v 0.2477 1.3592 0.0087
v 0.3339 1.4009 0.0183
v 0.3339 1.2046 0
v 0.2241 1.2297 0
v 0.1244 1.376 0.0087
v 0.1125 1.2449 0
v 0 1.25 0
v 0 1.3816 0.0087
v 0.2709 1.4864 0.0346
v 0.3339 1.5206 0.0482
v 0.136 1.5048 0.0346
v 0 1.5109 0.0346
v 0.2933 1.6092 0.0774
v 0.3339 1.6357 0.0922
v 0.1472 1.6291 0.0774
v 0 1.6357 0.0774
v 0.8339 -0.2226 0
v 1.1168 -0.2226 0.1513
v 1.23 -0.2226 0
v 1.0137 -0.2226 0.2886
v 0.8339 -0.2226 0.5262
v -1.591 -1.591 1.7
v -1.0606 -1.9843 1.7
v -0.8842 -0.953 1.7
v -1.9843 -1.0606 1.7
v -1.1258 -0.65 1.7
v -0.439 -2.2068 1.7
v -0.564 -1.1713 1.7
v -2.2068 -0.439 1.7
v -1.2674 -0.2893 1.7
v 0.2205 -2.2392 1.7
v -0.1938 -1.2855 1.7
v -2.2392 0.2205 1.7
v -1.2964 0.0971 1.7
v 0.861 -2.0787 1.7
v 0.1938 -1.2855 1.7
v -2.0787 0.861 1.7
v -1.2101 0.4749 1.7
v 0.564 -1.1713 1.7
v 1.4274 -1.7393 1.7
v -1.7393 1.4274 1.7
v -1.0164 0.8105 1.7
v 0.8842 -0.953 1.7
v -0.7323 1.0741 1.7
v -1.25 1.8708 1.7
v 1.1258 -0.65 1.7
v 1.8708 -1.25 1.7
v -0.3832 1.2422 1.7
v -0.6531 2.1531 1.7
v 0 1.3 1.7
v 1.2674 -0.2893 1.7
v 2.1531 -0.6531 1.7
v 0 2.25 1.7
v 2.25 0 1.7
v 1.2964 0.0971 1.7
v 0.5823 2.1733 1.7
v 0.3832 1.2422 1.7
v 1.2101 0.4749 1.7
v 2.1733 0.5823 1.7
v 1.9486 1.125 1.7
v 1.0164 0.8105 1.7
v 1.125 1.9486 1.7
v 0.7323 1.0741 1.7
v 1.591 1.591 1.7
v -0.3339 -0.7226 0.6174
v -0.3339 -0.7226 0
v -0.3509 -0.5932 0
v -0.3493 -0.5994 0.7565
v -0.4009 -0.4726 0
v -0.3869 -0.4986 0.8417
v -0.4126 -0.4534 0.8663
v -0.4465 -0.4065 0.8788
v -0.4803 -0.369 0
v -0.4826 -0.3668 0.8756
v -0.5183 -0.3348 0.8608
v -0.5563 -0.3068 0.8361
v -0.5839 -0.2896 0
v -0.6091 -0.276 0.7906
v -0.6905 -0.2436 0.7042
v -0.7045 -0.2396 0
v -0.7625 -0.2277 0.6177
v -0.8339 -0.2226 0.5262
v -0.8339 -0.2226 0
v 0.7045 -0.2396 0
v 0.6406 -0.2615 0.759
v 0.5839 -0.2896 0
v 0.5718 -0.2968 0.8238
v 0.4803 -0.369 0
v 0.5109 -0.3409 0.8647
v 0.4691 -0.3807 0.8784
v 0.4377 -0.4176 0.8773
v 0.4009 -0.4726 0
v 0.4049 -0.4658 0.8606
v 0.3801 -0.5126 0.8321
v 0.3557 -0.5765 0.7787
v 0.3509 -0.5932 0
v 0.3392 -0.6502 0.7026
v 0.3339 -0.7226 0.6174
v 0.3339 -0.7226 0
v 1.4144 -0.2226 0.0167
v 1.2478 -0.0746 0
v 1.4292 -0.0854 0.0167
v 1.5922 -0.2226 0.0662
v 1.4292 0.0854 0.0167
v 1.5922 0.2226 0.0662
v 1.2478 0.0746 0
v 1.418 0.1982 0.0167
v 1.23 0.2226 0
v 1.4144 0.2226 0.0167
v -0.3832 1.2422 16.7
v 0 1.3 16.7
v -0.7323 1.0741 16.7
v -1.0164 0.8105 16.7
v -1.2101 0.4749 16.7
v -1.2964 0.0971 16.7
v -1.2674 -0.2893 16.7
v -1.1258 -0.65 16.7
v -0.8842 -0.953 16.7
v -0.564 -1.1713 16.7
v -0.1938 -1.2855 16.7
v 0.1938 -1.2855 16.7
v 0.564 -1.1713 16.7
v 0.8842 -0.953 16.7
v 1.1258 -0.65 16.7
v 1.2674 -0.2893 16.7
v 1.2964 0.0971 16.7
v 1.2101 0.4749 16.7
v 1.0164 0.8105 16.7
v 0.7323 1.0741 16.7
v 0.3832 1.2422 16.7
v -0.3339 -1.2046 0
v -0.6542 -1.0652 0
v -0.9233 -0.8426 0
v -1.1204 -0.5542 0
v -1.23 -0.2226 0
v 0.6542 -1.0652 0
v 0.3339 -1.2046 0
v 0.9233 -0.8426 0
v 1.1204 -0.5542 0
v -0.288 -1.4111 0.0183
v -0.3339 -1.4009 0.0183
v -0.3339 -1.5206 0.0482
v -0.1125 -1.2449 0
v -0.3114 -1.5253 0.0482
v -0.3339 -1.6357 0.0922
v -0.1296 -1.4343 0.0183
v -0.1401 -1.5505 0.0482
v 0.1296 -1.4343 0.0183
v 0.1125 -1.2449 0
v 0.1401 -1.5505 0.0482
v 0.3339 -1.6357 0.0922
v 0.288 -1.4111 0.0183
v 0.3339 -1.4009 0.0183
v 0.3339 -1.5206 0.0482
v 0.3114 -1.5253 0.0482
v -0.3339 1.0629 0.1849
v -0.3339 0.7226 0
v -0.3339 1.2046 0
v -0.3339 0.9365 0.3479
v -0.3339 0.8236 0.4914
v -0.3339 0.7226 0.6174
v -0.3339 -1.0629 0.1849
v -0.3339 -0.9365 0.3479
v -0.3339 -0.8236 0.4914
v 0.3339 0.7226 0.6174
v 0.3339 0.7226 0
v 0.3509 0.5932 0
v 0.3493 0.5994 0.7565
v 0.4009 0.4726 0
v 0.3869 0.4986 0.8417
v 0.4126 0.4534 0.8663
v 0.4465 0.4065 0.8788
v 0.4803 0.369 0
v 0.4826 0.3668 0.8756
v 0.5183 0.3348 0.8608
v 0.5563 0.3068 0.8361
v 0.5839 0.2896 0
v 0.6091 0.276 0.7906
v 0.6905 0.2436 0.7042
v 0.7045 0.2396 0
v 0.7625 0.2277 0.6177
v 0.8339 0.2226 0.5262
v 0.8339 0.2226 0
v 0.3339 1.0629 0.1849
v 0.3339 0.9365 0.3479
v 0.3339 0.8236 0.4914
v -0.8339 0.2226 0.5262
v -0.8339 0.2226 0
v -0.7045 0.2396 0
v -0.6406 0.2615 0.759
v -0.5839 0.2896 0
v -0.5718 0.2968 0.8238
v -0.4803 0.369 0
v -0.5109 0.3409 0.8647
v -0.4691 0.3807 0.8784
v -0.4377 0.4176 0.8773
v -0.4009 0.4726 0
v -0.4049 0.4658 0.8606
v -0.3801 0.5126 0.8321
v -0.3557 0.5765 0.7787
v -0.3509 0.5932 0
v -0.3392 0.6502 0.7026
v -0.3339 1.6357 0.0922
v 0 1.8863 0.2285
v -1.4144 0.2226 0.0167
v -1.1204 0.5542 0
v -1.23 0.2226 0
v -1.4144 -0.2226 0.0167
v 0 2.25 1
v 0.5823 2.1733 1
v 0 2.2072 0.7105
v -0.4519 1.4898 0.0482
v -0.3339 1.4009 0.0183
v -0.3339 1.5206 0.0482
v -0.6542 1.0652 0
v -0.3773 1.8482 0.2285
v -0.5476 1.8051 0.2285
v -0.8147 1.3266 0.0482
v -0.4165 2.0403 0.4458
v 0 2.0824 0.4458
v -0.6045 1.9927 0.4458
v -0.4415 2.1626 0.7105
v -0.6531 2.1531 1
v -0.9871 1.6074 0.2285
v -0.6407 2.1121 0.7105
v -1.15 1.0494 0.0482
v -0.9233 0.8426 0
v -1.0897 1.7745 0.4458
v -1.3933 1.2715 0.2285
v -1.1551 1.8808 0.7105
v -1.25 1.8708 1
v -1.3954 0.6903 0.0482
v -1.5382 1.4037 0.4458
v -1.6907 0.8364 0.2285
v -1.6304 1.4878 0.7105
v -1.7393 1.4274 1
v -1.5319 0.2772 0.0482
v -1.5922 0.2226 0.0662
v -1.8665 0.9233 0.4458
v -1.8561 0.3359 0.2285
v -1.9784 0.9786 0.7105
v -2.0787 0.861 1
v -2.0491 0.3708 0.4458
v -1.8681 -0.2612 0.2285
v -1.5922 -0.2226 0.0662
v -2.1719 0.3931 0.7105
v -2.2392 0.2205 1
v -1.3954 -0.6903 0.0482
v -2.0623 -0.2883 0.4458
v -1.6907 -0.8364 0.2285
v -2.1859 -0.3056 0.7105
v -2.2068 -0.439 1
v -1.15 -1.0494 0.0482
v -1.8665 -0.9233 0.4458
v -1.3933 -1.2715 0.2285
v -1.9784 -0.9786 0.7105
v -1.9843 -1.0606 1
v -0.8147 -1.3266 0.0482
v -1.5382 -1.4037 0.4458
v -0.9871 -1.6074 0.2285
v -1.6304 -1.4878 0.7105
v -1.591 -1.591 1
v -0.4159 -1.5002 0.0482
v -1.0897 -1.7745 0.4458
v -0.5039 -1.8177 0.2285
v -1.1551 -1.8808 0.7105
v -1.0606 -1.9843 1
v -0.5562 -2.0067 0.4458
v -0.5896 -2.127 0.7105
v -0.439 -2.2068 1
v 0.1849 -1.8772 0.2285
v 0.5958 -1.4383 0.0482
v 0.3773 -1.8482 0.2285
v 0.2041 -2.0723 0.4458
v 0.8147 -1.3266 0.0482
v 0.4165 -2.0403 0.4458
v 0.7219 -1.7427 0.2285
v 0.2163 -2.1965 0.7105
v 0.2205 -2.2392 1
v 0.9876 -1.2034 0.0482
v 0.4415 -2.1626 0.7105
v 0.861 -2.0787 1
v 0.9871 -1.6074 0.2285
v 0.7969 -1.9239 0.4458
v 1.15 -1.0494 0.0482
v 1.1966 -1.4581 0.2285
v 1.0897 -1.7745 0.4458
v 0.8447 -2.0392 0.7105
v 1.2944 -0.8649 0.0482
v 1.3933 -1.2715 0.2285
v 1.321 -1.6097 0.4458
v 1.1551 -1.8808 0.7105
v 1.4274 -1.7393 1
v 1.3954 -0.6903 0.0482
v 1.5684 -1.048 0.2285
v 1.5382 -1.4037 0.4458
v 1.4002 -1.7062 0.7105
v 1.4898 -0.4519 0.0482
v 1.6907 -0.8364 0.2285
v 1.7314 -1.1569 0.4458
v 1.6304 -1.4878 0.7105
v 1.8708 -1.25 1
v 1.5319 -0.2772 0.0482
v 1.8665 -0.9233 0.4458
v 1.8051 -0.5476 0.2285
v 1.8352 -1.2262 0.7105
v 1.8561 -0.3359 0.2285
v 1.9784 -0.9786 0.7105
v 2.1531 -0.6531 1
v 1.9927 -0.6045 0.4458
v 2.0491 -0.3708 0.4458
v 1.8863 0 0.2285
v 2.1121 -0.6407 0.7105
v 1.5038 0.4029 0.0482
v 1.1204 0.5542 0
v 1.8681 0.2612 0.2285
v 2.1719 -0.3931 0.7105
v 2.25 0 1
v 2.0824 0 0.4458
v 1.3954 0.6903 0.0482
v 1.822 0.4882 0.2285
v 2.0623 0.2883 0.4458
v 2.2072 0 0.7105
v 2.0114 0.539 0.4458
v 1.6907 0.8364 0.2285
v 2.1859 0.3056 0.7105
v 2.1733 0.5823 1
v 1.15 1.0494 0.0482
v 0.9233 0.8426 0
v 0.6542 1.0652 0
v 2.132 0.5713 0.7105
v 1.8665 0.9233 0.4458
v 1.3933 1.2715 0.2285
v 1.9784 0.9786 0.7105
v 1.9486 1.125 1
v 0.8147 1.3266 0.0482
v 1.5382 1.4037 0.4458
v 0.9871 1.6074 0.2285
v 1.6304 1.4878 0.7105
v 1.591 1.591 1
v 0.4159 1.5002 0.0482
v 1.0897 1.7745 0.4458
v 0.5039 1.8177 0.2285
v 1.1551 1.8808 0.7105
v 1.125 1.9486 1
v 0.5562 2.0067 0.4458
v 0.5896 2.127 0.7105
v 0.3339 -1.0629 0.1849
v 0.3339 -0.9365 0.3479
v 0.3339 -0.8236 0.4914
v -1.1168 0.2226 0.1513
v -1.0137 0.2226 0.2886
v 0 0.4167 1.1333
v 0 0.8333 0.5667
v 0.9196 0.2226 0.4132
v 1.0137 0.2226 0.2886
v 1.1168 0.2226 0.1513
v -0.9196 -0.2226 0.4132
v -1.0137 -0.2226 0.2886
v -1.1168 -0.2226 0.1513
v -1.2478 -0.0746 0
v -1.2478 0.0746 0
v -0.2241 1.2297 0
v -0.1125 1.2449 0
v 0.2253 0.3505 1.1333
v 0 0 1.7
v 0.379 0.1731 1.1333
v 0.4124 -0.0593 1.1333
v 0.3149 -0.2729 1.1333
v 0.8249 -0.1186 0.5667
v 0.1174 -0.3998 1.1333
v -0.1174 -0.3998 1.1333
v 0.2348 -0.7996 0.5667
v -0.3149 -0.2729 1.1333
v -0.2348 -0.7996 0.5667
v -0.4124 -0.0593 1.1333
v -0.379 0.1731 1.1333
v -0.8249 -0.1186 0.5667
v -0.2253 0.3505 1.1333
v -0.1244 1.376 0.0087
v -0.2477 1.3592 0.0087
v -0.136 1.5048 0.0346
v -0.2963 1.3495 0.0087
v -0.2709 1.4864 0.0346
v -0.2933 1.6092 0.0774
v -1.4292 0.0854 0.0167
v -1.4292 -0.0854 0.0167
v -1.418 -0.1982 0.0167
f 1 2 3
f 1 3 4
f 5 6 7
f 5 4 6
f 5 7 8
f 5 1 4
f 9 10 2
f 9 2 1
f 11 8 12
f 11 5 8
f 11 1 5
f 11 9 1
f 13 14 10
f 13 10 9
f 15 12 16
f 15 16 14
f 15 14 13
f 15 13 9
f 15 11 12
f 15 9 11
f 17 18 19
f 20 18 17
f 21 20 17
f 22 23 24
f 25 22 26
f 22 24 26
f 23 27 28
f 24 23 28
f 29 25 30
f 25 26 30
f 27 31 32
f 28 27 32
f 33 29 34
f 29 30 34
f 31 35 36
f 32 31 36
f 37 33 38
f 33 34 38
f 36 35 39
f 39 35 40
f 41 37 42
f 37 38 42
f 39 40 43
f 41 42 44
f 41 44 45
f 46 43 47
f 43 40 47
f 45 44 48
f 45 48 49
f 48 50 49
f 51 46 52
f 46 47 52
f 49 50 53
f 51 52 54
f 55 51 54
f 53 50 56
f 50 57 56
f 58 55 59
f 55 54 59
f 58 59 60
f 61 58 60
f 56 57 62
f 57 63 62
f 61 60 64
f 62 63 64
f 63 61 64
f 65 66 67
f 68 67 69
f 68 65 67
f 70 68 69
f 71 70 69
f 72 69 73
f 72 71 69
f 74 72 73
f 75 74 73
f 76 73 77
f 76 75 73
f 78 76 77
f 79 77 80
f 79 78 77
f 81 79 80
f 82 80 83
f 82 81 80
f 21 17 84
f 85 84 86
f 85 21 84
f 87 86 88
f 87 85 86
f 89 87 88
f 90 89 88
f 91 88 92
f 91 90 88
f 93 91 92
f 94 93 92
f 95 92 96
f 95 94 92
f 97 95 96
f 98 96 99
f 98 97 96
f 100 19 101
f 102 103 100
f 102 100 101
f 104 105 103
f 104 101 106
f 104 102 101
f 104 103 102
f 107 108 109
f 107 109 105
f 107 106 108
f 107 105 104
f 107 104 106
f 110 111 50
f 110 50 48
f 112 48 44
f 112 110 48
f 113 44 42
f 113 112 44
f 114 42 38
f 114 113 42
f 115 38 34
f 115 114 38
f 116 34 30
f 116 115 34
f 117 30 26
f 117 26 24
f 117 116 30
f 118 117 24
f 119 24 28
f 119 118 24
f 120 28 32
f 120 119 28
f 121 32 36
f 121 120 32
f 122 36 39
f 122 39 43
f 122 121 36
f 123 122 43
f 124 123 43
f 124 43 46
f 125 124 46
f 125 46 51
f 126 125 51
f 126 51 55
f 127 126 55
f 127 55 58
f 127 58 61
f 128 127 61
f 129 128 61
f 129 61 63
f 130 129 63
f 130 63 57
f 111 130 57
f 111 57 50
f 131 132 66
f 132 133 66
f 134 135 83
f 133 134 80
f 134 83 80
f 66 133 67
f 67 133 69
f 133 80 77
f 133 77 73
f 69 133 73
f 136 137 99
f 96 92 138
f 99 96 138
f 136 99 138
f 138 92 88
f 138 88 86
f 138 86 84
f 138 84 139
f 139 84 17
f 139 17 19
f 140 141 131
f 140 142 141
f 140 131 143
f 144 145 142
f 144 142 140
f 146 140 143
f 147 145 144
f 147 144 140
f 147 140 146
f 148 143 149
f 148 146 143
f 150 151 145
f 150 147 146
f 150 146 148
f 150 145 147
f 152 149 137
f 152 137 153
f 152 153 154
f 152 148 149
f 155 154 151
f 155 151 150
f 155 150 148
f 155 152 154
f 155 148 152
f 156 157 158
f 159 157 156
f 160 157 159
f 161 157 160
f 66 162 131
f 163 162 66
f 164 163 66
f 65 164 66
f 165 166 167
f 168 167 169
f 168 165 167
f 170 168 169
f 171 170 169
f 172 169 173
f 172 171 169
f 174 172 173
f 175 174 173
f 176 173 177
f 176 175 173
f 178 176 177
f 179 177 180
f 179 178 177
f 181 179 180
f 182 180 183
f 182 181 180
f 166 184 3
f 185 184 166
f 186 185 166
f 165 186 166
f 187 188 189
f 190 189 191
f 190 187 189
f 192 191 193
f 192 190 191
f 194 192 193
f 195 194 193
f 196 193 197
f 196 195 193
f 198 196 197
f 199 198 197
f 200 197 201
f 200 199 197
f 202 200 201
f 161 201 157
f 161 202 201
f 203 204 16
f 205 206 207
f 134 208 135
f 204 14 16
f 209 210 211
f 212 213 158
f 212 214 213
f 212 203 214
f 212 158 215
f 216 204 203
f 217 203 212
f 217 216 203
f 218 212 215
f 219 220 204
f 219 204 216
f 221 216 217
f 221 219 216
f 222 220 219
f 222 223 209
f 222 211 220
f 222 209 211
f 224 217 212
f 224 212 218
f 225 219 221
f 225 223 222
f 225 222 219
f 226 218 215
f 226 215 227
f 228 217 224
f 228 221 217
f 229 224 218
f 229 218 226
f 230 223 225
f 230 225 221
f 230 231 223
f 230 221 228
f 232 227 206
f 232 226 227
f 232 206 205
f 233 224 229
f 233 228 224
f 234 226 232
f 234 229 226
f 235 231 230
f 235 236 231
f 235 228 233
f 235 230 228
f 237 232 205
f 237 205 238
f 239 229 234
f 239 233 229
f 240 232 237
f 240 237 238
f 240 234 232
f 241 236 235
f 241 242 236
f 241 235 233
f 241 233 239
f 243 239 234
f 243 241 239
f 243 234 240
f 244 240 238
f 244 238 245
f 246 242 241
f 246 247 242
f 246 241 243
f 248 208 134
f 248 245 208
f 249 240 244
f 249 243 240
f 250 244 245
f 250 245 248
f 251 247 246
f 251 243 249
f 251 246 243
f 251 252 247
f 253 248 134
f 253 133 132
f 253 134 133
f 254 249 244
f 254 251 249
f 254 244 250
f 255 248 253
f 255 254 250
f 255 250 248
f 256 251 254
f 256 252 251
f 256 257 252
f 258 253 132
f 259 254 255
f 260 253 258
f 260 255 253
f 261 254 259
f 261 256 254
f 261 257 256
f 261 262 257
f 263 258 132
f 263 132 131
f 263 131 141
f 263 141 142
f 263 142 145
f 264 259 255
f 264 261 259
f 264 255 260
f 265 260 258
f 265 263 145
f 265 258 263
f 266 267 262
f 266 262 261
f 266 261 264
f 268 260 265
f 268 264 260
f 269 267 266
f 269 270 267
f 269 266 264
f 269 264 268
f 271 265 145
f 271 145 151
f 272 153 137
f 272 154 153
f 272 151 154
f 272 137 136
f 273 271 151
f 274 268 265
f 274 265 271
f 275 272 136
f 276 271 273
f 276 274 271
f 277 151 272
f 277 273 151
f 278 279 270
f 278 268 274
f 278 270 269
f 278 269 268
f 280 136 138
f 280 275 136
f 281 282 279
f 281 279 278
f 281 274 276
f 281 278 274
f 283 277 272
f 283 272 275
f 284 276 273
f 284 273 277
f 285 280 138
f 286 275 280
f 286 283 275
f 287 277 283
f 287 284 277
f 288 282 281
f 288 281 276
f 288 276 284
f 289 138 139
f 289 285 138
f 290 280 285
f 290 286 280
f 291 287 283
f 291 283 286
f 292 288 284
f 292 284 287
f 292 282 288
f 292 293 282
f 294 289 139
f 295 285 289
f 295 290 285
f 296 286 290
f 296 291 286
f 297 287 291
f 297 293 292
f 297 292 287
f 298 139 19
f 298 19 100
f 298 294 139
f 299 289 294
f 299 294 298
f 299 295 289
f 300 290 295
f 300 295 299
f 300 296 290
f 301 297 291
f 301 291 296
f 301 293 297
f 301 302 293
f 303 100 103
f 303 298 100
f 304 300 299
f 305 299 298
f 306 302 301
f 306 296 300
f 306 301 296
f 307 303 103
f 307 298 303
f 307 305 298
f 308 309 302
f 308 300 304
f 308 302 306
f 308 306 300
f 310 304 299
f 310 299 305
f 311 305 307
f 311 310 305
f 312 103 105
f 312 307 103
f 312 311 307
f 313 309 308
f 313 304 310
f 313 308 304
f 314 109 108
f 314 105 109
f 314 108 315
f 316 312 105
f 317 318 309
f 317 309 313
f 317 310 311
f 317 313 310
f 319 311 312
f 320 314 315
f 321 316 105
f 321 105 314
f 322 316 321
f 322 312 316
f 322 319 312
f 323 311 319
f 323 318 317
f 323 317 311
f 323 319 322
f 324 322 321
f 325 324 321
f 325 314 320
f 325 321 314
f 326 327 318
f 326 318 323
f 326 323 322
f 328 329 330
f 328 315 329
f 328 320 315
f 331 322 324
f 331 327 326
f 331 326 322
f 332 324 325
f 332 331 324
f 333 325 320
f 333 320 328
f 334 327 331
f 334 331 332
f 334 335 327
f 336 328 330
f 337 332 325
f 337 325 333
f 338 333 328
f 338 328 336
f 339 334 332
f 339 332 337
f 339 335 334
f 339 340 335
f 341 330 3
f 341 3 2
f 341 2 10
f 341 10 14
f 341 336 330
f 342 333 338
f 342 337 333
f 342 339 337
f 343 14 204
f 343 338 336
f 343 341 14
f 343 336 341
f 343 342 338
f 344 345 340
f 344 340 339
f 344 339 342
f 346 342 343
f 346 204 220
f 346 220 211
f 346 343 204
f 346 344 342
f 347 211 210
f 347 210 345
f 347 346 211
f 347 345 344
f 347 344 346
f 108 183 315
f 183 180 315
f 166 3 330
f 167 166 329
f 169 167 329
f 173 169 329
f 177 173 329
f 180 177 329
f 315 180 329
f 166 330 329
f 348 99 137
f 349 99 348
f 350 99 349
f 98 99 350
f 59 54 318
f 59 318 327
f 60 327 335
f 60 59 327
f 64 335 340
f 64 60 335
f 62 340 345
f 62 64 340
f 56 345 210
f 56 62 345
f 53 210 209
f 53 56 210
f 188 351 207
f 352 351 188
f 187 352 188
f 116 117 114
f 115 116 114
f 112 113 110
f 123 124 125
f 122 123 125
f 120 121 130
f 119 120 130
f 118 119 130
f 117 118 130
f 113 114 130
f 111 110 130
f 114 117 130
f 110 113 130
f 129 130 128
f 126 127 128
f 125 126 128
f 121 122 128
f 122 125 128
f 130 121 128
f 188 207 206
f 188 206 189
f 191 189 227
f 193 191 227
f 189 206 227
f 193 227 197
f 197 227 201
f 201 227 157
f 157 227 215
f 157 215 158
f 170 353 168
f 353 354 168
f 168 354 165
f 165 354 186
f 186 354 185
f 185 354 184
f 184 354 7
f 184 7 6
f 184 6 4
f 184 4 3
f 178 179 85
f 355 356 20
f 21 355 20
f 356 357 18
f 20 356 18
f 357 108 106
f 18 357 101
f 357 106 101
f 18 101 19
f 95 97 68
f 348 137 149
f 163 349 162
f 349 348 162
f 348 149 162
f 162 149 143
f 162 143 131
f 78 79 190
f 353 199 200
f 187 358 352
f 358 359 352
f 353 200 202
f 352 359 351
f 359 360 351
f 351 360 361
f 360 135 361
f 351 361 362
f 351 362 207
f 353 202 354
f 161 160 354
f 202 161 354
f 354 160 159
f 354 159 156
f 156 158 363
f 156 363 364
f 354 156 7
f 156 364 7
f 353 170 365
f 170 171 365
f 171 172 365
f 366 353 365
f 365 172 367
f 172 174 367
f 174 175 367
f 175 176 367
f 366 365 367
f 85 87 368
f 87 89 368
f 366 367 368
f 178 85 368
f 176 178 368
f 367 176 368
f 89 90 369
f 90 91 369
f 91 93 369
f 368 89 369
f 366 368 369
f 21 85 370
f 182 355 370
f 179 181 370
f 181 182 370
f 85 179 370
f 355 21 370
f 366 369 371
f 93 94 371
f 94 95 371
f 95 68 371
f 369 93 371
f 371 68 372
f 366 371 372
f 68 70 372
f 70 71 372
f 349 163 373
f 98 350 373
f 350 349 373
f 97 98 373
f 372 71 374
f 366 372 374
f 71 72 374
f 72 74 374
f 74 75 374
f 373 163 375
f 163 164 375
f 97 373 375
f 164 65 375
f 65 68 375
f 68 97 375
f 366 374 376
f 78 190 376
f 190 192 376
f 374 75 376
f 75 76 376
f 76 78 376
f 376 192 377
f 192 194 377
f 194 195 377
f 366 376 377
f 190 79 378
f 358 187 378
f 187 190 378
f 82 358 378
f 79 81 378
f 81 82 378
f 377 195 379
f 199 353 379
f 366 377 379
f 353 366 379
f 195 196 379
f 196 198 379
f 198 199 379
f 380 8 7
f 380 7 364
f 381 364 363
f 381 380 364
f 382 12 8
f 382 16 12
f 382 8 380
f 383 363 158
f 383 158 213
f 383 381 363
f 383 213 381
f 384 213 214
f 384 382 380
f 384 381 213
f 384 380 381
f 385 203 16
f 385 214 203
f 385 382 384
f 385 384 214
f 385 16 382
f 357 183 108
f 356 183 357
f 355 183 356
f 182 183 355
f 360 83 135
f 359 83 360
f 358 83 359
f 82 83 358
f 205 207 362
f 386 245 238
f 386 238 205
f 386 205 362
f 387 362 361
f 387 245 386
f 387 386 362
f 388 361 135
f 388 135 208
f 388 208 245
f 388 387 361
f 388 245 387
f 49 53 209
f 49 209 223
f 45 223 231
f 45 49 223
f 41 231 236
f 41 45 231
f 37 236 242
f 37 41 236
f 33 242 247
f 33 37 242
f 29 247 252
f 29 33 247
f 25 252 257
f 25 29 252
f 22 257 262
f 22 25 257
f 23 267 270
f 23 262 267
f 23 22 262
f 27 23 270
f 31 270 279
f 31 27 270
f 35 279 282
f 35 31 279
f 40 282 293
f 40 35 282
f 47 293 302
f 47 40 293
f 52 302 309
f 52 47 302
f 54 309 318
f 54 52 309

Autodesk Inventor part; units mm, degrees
ref_plane "YZ Plane" through (0, 0, 0) normal (1, 0, 0) x (0, 1, 0)
ref_plane "XZ Plane" through (0, 0, 0) normal (0, 1, 0) x (-1, 0, 0)
ref_plane "XY Plane" through (0, 0, 0) normal (0, 0, 1) x (1, 0, 0)
sketch "スケッチ1" plane through (0, 0, 0) normal (1, 0, 0) x (0, 1, 0)
  line L0 (0, 16.7) -> (0, 0)
  line L1 (0, 0) -> (1.25, 0)
  line L2 (2.25, 1) -> (2.25, 1.7)
  line L3 (2.25, 1.7) -> (1.3, 1.7)
  line L4 (1.3, 1.7) -> (1.3, 16.7)
  line L5 (1.3, 16.7) -> (0, 16.7)
  line L6 (1.25, 0) -> (0, 1.7)
  arc A0 (1.25, 0) -> (2.25, 1) centre (1.25, 1) ccw
  line L7 (1.25, 0) -> (2.25, 0)
  line L8 (2.25, 0) -> (2.25, 1)
  dimension "d2" = 1.7
  dimension "d10" = 15
  dimension "d11" = 2.6
  dimension "d12" = 4.5
  dimension "d14" = 1
revolve "回転1" add sketch "スケッチ1" angle 360 about axis through (0, 0, 16.7) along (0, 0, -1) contours L5 L4 L3 L2 A0 L6 L0
thread "ねじ1" size "M2.6x0.45" class "6g" standard "ANSI Metric M Profile" full length
sketch "スケッチ2" plane through (0, 0, 1.7) normal (0, 0, 1) x (1, 0, 0)
  line L0 (0.3339, -1.6357) -> (-0.3339, -1.6357)
  line L1 (-0.3339, -1.6357) -> (-0.3339, -0.7226)
  line L2 (-0.3339, 1.6357) -> (0.3339, 1.6357)
  line L3 (0.3339, 1.6357) -> (0.3339, 0.7226)
  line L4 (0.3339, -1.6357) -> (-0.3339, 1.6357) construction
  line L5 (-0.3339, -1.6357) -> (0.3339, 1.6357) construction
  line L6 (-1.5922, 0.2226) -> (-0.8339, 0.2226)
  line L7 (1.5922, 0.2226) -> (1.5922, -0.2226)
  line L8 (1.5922, -0.2226) -> (0.8339, -0.2226)
  line L9 (-1.5922, -0.2226) -> (-1.5922, 0.2226)
  line L10 (-1.5922, 0.2226) -> (1.5922, -0.2226) construction
  line L11 (1.5922, 0.2226) -> (-1.5922, -0.2226) construction
  circle A0 centre (0, 0) radius 2.25
  line L12 (0.3339, -0.7226) -> (0.3339, -1.6357)
  line L13 (0.8339, 0.2226) -> (1.5922, 0.2226)
  line L14 (-0.8339, -0.2226) -> (-1.5922, -0.2226)
  line L15 (-0.3339, 0.7226) -> (-0.3339, 1.6357)
  arc A1 (0.8339, -0.2226) -> (0.3339, -0.7226) centre (0.8339, -0.7226) ccw
  arc A2 (0.3339, 0.7226) -> (0.8339, 0.2226) centre (0.8339, 0.7226) ccw
  arc A3 (-0.8339, 0.2226) -> (-0.3339, 0.7226) centre (-0.8339, 0.7226) ccw
  arc A4 (-0.3339, -0.7226) -> (-0.8339, -0.2226) centre (-0.8339, -0.7226) ccw
  point P0 (-0.3339, -0.2226)
  point P1 (-0.3339, 0.2226)
  point P2 (0.3339, 0.2226)
  point P3 (0.3339, -0.2226)
  dimension "d18" = 0.5
extrude "押し出し2" add sketch "スケッチ2" against normal blind 1.7
revolve "回転2" cut sketch "スケッチ1" angle 360 about axis through (0, 0, 16.7) along (0, 0, -1) contours A0 L8 L7
properties part number "F-2615EB" material "チタン"
